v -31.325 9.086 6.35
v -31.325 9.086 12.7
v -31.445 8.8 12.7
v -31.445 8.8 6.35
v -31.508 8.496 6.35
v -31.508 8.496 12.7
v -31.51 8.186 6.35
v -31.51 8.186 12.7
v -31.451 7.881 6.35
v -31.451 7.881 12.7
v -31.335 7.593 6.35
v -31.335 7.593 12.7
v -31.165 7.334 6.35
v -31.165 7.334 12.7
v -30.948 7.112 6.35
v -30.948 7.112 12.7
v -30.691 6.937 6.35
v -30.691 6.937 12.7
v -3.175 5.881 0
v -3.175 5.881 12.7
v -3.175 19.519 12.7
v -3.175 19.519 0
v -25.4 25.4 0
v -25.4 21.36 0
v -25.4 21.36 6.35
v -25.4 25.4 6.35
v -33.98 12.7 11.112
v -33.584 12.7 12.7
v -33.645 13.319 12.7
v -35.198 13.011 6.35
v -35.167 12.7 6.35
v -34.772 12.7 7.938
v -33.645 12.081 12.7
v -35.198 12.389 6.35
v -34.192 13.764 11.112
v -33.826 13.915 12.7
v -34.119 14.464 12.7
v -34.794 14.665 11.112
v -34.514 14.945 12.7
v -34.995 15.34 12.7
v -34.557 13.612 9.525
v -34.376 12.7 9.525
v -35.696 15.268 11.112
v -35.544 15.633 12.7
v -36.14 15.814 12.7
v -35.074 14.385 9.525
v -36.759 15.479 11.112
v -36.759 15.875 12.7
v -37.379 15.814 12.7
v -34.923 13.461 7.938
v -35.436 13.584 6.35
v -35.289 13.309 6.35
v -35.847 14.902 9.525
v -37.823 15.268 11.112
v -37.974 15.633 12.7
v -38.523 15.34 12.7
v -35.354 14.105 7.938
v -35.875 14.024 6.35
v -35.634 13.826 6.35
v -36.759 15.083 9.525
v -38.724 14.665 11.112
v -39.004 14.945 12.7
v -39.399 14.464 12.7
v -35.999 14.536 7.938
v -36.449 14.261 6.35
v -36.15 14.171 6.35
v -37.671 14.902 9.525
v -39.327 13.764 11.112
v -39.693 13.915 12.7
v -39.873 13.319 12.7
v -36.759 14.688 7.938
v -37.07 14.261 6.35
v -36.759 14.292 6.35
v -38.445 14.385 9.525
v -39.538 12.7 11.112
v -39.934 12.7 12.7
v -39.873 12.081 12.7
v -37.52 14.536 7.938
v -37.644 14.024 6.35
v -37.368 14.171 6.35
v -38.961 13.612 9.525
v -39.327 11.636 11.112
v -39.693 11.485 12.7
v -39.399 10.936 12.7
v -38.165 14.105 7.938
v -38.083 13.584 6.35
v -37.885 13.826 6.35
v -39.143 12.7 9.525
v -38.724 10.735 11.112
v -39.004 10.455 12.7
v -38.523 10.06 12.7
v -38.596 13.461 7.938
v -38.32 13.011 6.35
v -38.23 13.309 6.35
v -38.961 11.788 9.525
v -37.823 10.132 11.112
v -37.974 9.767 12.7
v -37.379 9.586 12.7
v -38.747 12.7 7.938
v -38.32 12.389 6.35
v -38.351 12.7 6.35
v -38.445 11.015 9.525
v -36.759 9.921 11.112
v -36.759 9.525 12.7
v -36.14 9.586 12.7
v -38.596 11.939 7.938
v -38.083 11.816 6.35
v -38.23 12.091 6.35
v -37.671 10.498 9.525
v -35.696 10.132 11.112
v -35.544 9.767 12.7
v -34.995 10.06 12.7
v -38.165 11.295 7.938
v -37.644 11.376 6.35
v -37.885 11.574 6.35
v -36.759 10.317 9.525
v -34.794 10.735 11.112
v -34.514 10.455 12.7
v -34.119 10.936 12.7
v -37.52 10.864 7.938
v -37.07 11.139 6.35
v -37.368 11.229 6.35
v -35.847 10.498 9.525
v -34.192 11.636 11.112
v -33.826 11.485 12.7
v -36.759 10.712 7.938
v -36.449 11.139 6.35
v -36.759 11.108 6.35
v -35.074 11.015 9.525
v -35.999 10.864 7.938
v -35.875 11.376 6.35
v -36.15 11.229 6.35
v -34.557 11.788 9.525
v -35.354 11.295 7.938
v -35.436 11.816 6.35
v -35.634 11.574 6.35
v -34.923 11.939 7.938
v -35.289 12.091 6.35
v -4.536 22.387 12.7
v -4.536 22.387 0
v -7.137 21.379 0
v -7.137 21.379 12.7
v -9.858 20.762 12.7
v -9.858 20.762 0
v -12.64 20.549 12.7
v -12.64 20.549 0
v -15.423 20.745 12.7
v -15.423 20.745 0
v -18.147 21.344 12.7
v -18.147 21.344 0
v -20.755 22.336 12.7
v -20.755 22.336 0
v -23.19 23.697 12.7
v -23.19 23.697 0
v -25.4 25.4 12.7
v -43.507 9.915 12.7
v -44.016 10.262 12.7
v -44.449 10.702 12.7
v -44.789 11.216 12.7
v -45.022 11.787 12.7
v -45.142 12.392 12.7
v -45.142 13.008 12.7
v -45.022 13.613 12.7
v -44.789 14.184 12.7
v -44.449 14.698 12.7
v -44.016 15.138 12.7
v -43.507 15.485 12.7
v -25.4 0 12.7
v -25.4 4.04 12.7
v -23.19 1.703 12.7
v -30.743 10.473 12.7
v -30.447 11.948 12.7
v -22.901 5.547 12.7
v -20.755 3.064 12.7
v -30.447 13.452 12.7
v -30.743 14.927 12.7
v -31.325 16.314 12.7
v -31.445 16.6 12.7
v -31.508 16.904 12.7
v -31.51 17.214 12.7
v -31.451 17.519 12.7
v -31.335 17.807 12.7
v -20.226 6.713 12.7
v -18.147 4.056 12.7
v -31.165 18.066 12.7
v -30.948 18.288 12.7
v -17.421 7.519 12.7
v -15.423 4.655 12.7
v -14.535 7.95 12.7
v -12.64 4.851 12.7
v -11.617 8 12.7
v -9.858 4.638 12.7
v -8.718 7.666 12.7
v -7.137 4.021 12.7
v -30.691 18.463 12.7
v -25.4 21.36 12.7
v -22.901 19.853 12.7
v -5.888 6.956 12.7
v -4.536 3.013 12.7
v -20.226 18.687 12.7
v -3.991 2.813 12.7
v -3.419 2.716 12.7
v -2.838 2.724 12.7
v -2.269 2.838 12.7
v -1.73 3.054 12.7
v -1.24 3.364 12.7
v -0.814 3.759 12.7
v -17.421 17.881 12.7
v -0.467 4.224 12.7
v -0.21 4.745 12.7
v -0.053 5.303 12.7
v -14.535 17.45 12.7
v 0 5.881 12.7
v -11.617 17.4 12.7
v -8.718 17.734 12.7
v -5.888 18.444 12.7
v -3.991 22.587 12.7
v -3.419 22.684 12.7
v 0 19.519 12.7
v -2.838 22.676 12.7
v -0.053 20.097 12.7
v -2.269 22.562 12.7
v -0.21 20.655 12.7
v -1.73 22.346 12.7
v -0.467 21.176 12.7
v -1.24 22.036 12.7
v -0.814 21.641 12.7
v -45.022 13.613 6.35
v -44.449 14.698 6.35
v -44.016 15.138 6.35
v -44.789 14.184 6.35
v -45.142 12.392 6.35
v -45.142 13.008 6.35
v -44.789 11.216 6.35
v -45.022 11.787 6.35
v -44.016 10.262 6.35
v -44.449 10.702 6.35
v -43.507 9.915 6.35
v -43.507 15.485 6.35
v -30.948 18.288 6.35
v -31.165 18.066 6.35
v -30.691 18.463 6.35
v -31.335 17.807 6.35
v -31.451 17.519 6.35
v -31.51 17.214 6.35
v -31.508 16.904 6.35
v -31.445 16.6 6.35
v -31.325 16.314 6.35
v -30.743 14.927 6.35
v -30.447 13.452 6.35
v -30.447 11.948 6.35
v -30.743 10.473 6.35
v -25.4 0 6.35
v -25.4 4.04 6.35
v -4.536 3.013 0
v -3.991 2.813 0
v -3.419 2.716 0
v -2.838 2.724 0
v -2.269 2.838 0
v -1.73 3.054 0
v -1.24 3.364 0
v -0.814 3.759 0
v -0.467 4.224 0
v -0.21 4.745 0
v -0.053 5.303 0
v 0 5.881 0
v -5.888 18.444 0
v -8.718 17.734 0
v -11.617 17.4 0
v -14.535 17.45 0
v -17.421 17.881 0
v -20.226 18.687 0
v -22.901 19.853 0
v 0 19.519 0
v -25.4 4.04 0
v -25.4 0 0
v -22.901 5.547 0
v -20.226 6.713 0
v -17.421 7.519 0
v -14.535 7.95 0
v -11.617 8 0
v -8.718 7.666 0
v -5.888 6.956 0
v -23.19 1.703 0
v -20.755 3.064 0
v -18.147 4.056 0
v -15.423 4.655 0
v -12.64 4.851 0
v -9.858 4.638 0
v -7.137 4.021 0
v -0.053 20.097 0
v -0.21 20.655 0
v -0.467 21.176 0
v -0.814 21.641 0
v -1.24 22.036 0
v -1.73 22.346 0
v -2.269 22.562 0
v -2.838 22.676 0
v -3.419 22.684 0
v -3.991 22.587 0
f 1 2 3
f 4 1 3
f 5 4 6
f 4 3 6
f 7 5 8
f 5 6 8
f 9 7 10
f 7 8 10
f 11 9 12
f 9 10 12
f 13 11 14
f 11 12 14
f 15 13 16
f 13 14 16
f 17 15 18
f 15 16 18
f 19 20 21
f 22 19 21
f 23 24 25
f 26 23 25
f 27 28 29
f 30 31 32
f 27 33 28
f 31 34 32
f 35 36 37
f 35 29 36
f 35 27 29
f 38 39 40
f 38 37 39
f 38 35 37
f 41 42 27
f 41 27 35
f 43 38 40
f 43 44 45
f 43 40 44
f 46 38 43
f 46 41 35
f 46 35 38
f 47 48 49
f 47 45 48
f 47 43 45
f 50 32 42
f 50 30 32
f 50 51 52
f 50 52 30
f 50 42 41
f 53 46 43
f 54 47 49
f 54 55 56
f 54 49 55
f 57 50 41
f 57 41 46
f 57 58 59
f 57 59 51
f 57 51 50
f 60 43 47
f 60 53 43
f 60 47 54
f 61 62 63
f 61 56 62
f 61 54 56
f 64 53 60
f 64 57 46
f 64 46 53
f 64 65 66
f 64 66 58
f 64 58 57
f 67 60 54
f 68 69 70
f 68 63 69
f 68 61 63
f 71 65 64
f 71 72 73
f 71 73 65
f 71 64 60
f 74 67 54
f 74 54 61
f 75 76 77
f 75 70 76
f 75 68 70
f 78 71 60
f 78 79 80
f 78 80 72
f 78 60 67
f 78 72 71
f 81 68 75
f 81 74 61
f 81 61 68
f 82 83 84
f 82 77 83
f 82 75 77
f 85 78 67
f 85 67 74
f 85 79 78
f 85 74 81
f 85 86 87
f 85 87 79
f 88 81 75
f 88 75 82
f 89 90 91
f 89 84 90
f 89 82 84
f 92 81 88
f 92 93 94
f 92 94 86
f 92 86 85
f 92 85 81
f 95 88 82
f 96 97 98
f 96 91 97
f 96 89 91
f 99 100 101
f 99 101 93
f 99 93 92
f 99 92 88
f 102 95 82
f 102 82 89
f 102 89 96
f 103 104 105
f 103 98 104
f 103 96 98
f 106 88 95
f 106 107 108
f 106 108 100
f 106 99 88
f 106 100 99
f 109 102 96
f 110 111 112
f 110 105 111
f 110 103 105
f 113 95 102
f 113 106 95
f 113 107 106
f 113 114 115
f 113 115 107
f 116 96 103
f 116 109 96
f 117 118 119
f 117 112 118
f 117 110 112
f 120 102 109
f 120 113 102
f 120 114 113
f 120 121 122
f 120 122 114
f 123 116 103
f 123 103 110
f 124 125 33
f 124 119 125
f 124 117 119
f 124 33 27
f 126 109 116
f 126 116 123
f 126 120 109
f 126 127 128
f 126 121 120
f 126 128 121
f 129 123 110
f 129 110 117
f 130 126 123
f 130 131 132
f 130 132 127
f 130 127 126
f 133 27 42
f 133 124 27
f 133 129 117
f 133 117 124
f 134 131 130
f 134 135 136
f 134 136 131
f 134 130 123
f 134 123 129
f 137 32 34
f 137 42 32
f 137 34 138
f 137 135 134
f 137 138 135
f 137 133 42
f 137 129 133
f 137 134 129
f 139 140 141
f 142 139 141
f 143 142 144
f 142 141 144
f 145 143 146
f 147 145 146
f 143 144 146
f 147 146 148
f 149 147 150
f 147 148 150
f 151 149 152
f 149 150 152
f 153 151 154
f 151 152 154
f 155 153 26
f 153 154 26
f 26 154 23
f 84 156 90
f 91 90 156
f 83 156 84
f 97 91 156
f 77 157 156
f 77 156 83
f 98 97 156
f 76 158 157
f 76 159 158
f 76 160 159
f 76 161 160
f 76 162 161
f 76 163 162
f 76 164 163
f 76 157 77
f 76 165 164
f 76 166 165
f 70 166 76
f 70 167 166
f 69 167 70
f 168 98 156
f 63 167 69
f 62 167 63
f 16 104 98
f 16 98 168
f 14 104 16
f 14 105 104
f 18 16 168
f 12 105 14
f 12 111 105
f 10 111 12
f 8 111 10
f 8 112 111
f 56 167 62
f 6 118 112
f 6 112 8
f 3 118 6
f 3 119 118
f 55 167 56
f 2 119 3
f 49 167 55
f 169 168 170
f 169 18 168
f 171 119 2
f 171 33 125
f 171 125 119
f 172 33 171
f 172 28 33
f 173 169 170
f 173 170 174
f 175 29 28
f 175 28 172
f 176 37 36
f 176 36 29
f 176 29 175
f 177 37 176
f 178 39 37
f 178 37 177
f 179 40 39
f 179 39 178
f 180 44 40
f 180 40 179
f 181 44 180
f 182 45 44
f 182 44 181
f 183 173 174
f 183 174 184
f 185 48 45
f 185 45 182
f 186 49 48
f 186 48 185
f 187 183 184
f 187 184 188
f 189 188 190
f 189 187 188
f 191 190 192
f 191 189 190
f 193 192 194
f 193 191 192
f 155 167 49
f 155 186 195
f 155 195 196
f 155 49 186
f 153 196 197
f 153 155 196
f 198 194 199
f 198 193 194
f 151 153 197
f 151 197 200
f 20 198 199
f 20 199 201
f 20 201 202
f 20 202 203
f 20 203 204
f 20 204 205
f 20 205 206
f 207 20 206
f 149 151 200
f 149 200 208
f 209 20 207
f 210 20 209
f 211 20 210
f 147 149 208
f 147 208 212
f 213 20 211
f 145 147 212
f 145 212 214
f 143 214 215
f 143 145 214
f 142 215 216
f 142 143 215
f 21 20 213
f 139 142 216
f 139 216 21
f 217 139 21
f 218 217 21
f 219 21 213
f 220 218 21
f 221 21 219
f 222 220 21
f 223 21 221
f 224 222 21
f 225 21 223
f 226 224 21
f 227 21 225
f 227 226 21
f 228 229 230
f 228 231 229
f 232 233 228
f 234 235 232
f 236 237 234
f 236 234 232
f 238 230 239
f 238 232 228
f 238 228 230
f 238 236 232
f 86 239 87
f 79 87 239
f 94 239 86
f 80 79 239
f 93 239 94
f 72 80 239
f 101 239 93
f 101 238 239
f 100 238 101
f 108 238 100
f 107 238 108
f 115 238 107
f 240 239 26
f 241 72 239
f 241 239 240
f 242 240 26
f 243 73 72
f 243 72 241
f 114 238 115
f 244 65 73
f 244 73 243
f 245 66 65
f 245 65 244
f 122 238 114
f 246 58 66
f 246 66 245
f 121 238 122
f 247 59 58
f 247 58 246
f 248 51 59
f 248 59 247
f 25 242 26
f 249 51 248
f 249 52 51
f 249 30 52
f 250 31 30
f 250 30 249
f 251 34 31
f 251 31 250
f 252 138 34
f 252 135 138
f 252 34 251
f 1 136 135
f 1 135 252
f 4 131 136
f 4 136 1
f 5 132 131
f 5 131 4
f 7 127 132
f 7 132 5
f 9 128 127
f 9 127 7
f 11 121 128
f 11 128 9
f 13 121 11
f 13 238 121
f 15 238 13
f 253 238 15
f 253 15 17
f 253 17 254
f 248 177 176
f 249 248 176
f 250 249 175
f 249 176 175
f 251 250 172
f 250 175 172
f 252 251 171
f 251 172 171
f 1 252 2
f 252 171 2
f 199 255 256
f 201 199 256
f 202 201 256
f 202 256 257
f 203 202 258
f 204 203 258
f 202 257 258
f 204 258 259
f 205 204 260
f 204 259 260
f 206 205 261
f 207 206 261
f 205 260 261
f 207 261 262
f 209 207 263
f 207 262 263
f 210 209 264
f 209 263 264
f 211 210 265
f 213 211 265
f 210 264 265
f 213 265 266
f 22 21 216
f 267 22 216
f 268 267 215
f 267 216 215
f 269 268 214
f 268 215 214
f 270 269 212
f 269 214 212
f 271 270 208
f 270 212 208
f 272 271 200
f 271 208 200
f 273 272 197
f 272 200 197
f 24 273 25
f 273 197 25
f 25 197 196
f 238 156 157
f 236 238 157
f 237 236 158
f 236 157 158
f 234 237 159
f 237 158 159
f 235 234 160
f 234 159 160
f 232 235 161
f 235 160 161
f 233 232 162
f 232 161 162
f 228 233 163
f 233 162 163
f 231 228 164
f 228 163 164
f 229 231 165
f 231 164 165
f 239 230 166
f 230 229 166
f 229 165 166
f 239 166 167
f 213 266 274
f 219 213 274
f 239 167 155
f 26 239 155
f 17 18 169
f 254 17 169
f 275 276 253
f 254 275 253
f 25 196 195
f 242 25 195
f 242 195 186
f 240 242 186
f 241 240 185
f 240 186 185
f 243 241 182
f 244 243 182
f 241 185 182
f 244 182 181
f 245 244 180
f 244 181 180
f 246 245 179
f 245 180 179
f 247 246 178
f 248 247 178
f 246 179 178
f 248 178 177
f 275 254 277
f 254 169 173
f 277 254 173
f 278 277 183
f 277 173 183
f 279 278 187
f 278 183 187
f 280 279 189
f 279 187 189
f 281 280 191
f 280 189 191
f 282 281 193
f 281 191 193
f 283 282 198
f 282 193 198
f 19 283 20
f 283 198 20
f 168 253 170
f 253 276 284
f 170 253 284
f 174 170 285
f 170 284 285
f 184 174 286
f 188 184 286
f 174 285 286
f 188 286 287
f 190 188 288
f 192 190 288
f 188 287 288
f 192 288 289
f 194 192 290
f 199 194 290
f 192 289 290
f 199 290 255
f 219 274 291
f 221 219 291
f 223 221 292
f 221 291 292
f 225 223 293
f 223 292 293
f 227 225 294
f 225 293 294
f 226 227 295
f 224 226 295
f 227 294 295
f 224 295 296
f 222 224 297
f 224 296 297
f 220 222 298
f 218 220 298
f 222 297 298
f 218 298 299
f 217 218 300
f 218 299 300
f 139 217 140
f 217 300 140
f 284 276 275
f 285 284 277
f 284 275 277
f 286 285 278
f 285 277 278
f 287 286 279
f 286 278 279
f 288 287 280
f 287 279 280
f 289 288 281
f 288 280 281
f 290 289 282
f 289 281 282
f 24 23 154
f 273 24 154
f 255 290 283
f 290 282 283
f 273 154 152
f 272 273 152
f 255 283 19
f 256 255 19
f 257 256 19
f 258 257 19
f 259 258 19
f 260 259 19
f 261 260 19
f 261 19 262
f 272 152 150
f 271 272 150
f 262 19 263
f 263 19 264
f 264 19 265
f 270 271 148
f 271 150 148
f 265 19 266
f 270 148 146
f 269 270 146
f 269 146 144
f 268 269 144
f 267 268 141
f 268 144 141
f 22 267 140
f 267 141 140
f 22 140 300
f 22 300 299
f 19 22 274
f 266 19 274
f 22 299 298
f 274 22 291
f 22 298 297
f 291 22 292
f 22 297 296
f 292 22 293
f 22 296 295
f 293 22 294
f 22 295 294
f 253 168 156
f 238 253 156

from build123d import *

# Parameters (mm, degrees)
F1_DEPTH = 12.7
F2_R     = 3.175
F3_DEPTH = 12.7
F3_TAPER = 14
F5_DEPTH = 12.7010001
F6_W     = 38.1
F6_H     = 6.35
F7_DEPTH = 25.401


with BuildPart() as f1:
    # F0 (on Top) → F1 (new body)
    with BuildSketch(Plane.XY):
        with BuildLine():
            ThreePointArc((-25.4, 25.4), (-53.7980633142, 12.7), (-25.4, 0))
            Line((-25.4, 0), (-34.5618496597, 0))
            Line((-34.5618496597, 0), (-34.5618496597, 25.4))
            Line((-34.5618496597, 25.4), (-25.4, 25.4))
        make_face()
        with BuildLine():
            Line((-34.5618496597, 0), (-25.4, 0))
            ThreePointArc((-25.4, 0), (-21.204965459, 5.7439235197), (-19.7203873372, 12.7))
            ThreePointArc((-19.7203873372, 12.7), (-21.204965459, 19.6560764803), (-25.4, 25.4))
            Line((-25.4, 25.4), (-34.5618496597, 25.4))
            Line((-34.5618496597, 25.4), (-34.5618496597, 0))
        make_face()
        with BuildLine():
            ThreePointArc((-19.7203873372, 12.7), (-21.204965459, 5.7439235197), (-25.4, 0))
            ThreePointArc((-25.4, 0), (-15.4225737421, 4.6554132358), (-4.5357142857, 3.0127938932))
            ThreePointArc((-4.5357142857, 3.0127938932), (-1.4778911139, 3.1980667262), (0, 5.8814314849))
            Line((0, 5.8814314849), (0, 19.5185685151))
            ThreePointArc((0, 19.5185685151), (-1.4778911139, 22.2019332738), (-4.5357142857, 22.3872061068))
            ThreePointArc((-4.5357142857, 22.3872061068), (-15.4225737421, 20.7445867642), (-25.4, 25.4))
            ThreePointArc((-25.4, 25.4), (-21.204965459, 19.6560764803), (-19.7203873372, 12.7))
        make_face()
    extrude(amount=F1_DEPTH)

    # F2 (on face) → F3 (cut, through all)
    with BuildSketch(Plane.XY.offset(12.7)):
        with Locations((-36.7592253257, 12.7)):
            Circle(F2_R)
    extrude(amount=-F3_DEPTH, taper=F3_TAPER, mode=Mode.SUBTRACT)

    # F4 (on face) → F5 (cut, through all)
    with BuildSketch(Plane.XY.offset(12.7)):
        with BuildLine():
            ThreePointArc((-25.4, 4.0399547456), (-14.535188109, 7.9500701216), (-3.175, 5.8814314849))
            Line((-3.175, 5.8814314849), (-3.175, 19.5185685151))
            ThreePointArc((-3.175, 19.5185685151), (-14.535188109, 17.4499298784), (-25.4, 21.3600452544))
            Line((-25.4, 21.3600452544), (-30.6912422422, 18.4625566245))
            ThreePointArc((-30.6912422422, 18.4625566245), (-31.4514193427, 17.5192344091), (-31.3248088175, 16.3143710139))
            ThreePointArc((-31.3248088175, 16.3143710139), (-30.4092253257, 12.7), (-31.3248088175, 9.0856289861))
            ThreePointArc((-31.3248088175, 9.0856289861), (-31.4514193427, 7.8807655909), (-30.6912422422, 6.9374433755))
            Line((-30.6912422422, 6.9374433755), (-25.4, 4.0399547456))
        make_face()
        with BuildLine():
            ThreePointArc((-25.4, 25.4), (-53.7980633142, 12.7), (-25.4, 0))
            Line((-25.4, 0), (-43.5066161293, 9.9151979742))
            ThreePointArc((-43.5066161293, 9.9151979742), (-45.1566562358, 12.7), (-43.5066161293, 15.4848020258))
            Line((-43.5066161293, 15.4848020258), (-25.4, 25.4))
        make_face()
    extrude(amount=-F5_DEPTH, mode=Mode.SUBTRACT)

    # F6 (on Front) → F7 (cut, through all)
    with BuildSketch(Plane.XZ):
        with Locations((-44.45, 3.175)):
            Rectangle(F6_W, F6_H)
    extrude(amount=-F7_DEPTH, mode=Mode.SUBTRACT)


solid = f1.part
